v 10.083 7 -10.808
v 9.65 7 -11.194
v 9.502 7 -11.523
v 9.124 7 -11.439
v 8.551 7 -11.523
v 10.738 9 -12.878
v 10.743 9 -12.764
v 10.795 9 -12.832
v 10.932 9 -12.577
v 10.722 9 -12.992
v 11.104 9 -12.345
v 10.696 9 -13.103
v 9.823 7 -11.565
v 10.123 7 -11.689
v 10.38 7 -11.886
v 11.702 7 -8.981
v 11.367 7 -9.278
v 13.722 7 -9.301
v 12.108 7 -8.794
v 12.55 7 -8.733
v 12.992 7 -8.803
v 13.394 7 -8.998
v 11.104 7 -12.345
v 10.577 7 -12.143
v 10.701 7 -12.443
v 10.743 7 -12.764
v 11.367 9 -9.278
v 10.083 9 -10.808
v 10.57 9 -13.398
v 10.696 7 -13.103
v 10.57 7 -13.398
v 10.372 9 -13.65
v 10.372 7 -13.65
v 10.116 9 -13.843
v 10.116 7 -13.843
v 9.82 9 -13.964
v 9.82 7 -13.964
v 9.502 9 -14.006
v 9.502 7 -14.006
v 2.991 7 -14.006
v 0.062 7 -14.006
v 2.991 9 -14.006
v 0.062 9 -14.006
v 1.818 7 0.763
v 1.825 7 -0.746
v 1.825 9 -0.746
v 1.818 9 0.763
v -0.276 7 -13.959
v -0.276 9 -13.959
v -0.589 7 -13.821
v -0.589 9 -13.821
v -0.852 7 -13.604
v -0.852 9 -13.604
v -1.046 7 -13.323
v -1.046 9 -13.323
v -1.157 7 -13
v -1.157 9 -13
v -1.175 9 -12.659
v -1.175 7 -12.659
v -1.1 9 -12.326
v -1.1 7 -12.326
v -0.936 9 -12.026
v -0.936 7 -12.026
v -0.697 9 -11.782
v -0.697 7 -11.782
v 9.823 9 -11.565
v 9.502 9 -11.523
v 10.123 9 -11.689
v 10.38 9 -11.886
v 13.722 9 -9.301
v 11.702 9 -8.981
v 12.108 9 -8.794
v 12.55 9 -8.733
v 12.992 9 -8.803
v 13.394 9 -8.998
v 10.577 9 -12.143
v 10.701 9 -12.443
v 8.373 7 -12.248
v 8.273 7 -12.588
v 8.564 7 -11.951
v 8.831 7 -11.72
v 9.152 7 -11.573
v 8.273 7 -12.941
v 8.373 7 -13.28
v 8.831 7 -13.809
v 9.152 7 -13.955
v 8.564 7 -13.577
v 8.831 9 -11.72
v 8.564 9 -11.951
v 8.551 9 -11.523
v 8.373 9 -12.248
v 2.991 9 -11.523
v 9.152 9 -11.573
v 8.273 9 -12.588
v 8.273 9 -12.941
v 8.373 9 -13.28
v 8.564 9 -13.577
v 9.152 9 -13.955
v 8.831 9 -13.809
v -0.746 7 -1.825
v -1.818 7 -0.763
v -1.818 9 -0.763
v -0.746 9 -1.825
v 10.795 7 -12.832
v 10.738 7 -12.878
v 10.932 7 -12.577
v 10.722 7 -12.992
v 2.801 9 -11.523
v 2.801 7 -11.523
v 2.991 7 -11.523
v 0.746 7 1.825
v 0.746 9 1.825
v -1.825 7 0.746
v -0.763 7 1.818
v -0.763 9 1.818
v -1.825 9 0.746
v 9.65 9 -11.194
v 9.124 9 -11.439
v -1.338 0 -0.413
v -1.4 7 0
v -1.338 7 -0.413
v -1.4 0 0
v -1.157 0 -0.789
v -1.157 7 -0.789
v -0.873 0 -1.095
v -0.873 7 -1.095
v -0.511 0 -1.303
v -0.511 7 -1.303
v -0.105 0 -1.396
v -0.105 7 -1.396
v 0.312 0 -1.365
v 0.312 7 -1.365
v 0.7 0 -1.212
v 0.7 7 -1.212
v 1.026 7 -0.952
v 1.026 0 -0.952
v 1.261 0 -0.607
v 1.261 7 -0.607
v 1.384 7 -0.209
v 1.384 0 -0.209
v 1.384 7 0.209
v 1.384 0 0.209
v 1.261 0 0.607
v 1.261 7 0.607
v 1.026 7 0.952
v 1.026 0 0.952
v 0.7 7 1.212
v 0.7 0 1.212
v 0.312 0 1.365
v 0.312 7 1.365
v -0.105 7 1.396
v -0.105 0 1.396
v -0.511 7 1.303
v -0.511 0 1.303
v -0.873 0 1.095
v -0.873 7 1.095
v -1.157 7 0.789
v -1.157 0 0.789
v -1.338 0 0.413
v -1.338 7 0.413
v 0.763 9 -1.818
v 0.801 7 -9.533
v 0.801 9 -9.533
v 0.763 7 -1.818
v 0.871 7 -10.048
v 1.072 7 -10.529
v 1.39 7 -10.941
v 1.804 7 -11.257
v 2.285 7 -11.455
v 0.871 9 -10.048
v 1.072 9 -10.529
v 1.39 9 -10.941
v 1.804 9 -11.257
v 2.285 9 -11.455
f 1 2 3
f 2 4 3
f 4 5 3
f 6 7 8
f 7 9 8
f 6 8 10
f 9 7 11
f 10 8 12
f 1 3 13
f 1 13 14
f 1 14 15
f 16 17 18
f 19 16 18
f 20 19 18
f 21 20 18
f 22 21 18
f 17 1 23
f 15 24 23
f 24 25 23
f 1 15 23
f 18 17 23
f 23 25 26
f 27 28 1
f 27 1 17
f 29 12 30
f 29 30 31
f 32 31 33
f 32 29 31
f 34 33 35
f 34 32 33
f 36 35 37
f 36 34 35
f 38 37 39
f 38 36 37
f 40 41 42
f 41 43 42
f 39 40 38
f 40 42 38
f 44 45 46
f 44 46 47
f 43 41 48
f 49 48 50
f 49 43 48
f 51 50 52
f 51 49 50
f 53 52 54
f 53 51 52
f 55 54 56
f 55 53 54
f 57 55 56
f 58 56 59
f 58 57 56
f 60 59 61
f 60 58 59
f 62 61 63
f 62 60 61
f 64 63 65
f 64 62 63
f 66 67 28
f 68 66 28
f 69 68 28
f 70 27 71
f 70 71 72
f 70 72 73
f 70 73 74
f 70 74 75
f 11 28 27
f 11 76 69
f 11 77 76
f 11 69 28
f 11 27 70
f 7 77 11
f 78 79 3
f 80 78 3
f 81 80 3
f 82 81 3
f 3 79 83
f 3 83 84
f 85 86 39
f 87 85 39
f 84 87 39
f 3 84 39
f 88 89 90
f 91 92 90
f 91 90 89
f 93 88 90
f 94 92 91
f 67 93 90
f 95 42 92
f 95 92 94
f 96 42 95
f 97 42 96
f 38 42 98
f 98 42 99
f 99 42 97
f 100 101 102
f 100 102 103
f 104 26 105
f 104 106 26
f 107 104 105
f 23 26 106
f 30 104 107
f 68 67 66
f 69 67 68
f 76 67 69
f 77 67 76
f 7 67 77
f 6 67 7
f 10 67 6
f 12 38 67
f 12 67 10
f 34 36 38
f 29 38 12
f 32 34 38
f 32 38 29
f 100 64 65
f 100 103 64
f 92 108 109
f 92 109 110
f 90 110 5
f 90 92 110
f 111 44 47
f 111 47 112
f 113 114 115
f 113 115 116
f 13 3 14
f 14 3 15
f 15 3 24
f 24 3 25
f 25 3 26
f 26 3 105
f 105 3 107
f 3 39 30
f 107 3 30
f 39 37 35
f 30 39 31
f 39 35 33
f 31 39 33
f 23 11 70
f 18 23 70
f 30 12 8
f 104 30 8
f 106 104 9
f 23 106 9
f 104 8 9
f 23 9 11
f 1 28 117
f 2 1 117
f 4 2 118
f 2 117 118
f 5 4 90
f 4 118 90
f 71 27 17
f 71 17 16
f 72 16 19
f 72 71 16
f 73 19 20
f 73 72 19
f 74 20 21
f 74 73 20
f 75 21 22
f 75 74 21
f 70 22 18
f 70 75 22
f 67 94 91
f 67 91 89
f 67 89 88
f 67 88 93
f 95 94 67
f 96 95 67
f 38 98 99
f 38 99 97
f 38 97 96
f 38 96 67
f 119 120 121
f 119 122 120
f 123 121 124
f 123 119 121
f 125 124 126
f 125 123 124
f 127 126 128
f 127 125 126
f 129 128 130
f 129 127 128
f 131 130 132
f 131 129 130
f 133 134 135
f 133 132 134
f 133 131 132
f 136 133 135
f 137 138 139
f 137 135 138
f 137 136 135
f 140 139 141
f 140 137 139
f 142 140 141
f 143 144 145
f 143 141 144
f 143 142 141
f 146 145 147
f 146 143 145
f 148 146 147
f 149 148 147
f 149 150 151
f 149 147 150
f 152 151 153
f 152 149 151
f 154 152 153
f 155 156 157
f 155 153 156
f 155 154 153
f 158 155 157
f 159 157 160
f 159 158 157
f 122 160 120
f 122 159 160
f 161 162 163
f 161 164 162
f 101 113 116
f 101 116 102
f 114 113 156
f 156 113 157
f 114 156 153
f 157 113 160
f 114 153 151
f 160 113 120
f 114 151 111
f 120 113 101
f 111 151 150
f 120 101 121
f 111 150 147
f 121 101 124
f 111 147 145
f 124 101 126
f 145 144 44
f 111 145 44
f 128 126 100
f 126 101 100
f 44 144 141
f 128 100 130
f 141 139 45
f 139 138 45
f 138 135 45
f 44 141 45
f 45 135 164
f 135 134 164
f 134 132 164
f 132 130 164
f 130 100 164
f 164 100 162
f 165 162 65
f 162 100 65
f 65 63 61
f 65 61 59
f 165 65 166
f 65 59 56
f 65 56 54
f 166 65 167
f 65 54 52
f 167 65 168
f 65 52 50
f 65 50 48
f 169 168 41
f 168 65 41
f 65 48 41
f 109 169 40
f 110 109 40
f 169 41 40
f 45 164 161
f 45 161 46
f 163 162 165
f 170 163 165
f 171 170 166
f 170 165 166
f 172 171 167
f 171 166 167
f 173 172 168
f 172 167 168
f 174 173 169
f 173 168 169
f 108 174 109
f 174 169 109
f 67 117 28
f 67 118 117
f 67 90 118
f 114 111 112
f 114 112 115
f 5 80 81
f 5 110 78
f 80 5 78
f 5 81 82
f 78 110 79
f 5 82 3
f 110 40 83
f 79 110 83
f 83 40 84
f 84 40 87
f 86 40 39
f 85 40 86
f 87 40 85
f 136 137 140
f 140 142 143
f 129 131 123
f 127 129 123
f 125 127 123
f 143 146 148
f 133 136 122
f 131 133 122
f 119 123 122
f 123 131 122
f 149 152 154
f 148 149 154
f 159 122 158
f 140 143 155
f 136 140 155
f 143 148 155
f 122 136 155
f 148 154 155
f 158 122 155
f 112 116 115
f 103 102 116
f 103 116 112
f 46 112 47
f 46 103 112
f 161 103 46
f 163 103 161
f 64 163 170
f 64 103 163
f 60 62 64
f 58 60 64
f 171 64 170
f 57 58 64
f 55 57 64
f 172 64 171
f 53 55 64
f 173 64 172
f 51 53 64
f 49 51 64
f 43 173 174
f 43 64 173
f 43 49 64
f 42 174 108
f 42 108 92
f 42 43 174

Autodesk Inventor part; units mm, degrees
ref_plane "YZ Plane" through (0, 0, 0) normal (1, 0, 0) x (0, 1, 0)
ref_plane "XZ Plane" through (0, 0, 0) normal (0, 1, 0) x (-1, 0, 0)
ref_plane "XY Plane" through (0, 0, 0) normal (0, 0, 1) x (1, 0, 0)
sketch "Sketch1" plane through (0, 0, 0) normal (0, 1, 0) x (-1, 0, 0)
  circle A0 centre (0, 0) radius 1.4
  dimension "d0" = 2.8
sketch "Sketch2" plane through (0, 0, 0) normal (0, 1, 0) x (-1, 0, 0)
  point P0 (0, 0)
extrude "Extrusion1" add sketch "Sketch1" along normal blind 7
sketch "Sketch3" plane through (0, 7, 0) normal (0, 1, 0) x (1, 0, 0)
  line L0 (1.8253, 0.7457) -> (1.818, -0.7634)
  line L1 (1.818, -0.7634) -> (0.7457, -1.8253)
  line L2 (0.7457, -1.8253) -> (-0.7634, -1.818)
  line L3 (-0.7634, -1.818) -> (-1.8253, -0.7457)
  line L4 (-1.8253, -0.7457) -> (-1.818, 0.7634)
  line L5 (-1.818, 0.7634) -> (-0.7457, 1.8253)
  line L6 (-0.7457, 1.8253) -> (0.7634, 1.818)
  line L7 (0.7634, 1.818) -> (1.8253, 0.7457)
  line L8 (-1.8216, 0.0088) -> (1.8216, -0.0088) construction
  line L9 (-0.0088, -1.8216) -> (0.0088, 1.8216) construction
  point P0 (0, 0)
  point P1 (0, 0)
  point P2 (0, 0)
  point P3 (0, 0)
extrude "Extrusion2" add sketch "Sketch3" along normal blind 2
sketch "Sketch4" plane through (-0.7457, 7, -1.8253) normal (0.0048553, 0, -0.9999882) x (-0.9999882, 0, -0.0048553)
  line L0 (-1.5091, 2) -> (0, 2)
  line L1 (0, 2) -> (0, 0)
  line L2 (0, 0) -> (-1.5091, 0)
  line L3 (-1.5091, 0) -> (-1.5091, 2)
  point P0 (-0.7546, -7)
extrude "Extrusion3" add sketch "Sketch4" along normal blind 10
sketch "Sketch5" plane through (0, 9, 0) normal (0, 1, 0) x (1, 0, 0)
  point P0 (0, 0)
sketch "Sketch6" plane through (0, 9, 0) normal (0, 1, 0) x (1, 0, 0)
  point P0 (0, 0)
thread "Thread1" size "M3x0.5" class "6g" standard "ANSI Metric M Profile" full length
sketch "Sketch7" plane through (0, 9, 0) normal (0, 1, 0) x (1, 0, 0)
  circle A0 centre (0.062, 12.7642) radius 1.2414
  point P0 (0, 0)
extrude "Extrusion4" add sketch "Sketch7" against normal blind 2
sketch "Sketch8" plane through (0, 9, 0) normal (0, 1, 0) x (1, 0, 0)
  point P0 (0, 0)
sketch "Sketch9" plane through (0, 9, 0) normal (0, 1, 0) x (1, 0, 0)
  point P0 (0, 0)
sketch "Sketch10" plane through (0, 9, 0) normal (0, 1, 0) x (1, 0, 0)
  line L0 (10.3239, 13.7463) -> (10.3549, 13.7463)
  point P0 (0, 0)
extrude "Extrusion5" [suppressed]
sketch "Sketch11" plane through (0, 9, 0) normal (0, 1, 0) x (1, 0, 0)
  point P0 (0, 0)
sketch "Sketch12" plane through (0, 9, 0) normal (0, 1, 0) x (1, 0, 0)
  point P0 (0, 0)
sketch "Sketch13" plane through (0, 9, 0) normal (0, 1, 0) x (1, 0, 0)
  line L0 (0.062, 11.5229) -> (9.5019, 11.5229)
  line L1 (0.062, 11.5229) -> (0.062, 14.0056)
  arc A0 (0.8117, 11.7749) -> (-0.6974, 11.7822) centre (0.062, 12.7642) ccw projected
  line L2 (0.062, 14.0056) -> (9.5019, 14.0056)
  line L3 (9.5019, 11.5229) -> (9.5019, 14.0056)
  point P0 (0, 0)
extrude "Extrusion6" add sketch "Sketch13" against normal blind 2
sketch "Sketch14" plane through (0, 9, 0) normal (0, 1, 0) x (1, 0, 0)
  line L0 (9.5019, 14.0056) -> (9.5019, 11.5229) projected
  circle A0 centre (9.5019, 12.7642) radius 1.2415
  point P0 (0, 0)
  dimension "d17" = 2.483
extrude "Extrusion7" add sketch "Sketch14" against normal blind 2
sketch "Sketch15" plane through (0, 9, 0) normal (0, 1, 0) x (1, 0, 0)
  arc A0 (9.4834, 11.5229) -> (9.4834, 14.0056) centre (9.5019, 12.7642) ccw projected
  line L0 (10.7434, 12.7642) -> (13.7224, 9.3009)
  line L1 (9.4834, 11.5229) -> (11.3674, 9.2776)
  line L2 (9.4834, 11.5229) -> (12.4144, 11.5229) construction
  arc A1 (11.3674, 9.2776) -> (13.7224, 9.3009) centre (12.5353, 10.2576) ccw
  point P0 (0, 0)
  dimension "d20" = 50
extrude "Extrusion8" add sketch "Sketch15" against normal blind 2
fillet "Fillet1" radius 2 1 edges at (0.8105, 8, -11.5229)
fillet "Fillet2" radius 2 1 edges at (9.5019, 8, -11.5229)
fillet "Fillet3" radius 2 1 edges at (10.7434, 8, -12.7642)
properties part number "Servo_Arm_Hook_M"
